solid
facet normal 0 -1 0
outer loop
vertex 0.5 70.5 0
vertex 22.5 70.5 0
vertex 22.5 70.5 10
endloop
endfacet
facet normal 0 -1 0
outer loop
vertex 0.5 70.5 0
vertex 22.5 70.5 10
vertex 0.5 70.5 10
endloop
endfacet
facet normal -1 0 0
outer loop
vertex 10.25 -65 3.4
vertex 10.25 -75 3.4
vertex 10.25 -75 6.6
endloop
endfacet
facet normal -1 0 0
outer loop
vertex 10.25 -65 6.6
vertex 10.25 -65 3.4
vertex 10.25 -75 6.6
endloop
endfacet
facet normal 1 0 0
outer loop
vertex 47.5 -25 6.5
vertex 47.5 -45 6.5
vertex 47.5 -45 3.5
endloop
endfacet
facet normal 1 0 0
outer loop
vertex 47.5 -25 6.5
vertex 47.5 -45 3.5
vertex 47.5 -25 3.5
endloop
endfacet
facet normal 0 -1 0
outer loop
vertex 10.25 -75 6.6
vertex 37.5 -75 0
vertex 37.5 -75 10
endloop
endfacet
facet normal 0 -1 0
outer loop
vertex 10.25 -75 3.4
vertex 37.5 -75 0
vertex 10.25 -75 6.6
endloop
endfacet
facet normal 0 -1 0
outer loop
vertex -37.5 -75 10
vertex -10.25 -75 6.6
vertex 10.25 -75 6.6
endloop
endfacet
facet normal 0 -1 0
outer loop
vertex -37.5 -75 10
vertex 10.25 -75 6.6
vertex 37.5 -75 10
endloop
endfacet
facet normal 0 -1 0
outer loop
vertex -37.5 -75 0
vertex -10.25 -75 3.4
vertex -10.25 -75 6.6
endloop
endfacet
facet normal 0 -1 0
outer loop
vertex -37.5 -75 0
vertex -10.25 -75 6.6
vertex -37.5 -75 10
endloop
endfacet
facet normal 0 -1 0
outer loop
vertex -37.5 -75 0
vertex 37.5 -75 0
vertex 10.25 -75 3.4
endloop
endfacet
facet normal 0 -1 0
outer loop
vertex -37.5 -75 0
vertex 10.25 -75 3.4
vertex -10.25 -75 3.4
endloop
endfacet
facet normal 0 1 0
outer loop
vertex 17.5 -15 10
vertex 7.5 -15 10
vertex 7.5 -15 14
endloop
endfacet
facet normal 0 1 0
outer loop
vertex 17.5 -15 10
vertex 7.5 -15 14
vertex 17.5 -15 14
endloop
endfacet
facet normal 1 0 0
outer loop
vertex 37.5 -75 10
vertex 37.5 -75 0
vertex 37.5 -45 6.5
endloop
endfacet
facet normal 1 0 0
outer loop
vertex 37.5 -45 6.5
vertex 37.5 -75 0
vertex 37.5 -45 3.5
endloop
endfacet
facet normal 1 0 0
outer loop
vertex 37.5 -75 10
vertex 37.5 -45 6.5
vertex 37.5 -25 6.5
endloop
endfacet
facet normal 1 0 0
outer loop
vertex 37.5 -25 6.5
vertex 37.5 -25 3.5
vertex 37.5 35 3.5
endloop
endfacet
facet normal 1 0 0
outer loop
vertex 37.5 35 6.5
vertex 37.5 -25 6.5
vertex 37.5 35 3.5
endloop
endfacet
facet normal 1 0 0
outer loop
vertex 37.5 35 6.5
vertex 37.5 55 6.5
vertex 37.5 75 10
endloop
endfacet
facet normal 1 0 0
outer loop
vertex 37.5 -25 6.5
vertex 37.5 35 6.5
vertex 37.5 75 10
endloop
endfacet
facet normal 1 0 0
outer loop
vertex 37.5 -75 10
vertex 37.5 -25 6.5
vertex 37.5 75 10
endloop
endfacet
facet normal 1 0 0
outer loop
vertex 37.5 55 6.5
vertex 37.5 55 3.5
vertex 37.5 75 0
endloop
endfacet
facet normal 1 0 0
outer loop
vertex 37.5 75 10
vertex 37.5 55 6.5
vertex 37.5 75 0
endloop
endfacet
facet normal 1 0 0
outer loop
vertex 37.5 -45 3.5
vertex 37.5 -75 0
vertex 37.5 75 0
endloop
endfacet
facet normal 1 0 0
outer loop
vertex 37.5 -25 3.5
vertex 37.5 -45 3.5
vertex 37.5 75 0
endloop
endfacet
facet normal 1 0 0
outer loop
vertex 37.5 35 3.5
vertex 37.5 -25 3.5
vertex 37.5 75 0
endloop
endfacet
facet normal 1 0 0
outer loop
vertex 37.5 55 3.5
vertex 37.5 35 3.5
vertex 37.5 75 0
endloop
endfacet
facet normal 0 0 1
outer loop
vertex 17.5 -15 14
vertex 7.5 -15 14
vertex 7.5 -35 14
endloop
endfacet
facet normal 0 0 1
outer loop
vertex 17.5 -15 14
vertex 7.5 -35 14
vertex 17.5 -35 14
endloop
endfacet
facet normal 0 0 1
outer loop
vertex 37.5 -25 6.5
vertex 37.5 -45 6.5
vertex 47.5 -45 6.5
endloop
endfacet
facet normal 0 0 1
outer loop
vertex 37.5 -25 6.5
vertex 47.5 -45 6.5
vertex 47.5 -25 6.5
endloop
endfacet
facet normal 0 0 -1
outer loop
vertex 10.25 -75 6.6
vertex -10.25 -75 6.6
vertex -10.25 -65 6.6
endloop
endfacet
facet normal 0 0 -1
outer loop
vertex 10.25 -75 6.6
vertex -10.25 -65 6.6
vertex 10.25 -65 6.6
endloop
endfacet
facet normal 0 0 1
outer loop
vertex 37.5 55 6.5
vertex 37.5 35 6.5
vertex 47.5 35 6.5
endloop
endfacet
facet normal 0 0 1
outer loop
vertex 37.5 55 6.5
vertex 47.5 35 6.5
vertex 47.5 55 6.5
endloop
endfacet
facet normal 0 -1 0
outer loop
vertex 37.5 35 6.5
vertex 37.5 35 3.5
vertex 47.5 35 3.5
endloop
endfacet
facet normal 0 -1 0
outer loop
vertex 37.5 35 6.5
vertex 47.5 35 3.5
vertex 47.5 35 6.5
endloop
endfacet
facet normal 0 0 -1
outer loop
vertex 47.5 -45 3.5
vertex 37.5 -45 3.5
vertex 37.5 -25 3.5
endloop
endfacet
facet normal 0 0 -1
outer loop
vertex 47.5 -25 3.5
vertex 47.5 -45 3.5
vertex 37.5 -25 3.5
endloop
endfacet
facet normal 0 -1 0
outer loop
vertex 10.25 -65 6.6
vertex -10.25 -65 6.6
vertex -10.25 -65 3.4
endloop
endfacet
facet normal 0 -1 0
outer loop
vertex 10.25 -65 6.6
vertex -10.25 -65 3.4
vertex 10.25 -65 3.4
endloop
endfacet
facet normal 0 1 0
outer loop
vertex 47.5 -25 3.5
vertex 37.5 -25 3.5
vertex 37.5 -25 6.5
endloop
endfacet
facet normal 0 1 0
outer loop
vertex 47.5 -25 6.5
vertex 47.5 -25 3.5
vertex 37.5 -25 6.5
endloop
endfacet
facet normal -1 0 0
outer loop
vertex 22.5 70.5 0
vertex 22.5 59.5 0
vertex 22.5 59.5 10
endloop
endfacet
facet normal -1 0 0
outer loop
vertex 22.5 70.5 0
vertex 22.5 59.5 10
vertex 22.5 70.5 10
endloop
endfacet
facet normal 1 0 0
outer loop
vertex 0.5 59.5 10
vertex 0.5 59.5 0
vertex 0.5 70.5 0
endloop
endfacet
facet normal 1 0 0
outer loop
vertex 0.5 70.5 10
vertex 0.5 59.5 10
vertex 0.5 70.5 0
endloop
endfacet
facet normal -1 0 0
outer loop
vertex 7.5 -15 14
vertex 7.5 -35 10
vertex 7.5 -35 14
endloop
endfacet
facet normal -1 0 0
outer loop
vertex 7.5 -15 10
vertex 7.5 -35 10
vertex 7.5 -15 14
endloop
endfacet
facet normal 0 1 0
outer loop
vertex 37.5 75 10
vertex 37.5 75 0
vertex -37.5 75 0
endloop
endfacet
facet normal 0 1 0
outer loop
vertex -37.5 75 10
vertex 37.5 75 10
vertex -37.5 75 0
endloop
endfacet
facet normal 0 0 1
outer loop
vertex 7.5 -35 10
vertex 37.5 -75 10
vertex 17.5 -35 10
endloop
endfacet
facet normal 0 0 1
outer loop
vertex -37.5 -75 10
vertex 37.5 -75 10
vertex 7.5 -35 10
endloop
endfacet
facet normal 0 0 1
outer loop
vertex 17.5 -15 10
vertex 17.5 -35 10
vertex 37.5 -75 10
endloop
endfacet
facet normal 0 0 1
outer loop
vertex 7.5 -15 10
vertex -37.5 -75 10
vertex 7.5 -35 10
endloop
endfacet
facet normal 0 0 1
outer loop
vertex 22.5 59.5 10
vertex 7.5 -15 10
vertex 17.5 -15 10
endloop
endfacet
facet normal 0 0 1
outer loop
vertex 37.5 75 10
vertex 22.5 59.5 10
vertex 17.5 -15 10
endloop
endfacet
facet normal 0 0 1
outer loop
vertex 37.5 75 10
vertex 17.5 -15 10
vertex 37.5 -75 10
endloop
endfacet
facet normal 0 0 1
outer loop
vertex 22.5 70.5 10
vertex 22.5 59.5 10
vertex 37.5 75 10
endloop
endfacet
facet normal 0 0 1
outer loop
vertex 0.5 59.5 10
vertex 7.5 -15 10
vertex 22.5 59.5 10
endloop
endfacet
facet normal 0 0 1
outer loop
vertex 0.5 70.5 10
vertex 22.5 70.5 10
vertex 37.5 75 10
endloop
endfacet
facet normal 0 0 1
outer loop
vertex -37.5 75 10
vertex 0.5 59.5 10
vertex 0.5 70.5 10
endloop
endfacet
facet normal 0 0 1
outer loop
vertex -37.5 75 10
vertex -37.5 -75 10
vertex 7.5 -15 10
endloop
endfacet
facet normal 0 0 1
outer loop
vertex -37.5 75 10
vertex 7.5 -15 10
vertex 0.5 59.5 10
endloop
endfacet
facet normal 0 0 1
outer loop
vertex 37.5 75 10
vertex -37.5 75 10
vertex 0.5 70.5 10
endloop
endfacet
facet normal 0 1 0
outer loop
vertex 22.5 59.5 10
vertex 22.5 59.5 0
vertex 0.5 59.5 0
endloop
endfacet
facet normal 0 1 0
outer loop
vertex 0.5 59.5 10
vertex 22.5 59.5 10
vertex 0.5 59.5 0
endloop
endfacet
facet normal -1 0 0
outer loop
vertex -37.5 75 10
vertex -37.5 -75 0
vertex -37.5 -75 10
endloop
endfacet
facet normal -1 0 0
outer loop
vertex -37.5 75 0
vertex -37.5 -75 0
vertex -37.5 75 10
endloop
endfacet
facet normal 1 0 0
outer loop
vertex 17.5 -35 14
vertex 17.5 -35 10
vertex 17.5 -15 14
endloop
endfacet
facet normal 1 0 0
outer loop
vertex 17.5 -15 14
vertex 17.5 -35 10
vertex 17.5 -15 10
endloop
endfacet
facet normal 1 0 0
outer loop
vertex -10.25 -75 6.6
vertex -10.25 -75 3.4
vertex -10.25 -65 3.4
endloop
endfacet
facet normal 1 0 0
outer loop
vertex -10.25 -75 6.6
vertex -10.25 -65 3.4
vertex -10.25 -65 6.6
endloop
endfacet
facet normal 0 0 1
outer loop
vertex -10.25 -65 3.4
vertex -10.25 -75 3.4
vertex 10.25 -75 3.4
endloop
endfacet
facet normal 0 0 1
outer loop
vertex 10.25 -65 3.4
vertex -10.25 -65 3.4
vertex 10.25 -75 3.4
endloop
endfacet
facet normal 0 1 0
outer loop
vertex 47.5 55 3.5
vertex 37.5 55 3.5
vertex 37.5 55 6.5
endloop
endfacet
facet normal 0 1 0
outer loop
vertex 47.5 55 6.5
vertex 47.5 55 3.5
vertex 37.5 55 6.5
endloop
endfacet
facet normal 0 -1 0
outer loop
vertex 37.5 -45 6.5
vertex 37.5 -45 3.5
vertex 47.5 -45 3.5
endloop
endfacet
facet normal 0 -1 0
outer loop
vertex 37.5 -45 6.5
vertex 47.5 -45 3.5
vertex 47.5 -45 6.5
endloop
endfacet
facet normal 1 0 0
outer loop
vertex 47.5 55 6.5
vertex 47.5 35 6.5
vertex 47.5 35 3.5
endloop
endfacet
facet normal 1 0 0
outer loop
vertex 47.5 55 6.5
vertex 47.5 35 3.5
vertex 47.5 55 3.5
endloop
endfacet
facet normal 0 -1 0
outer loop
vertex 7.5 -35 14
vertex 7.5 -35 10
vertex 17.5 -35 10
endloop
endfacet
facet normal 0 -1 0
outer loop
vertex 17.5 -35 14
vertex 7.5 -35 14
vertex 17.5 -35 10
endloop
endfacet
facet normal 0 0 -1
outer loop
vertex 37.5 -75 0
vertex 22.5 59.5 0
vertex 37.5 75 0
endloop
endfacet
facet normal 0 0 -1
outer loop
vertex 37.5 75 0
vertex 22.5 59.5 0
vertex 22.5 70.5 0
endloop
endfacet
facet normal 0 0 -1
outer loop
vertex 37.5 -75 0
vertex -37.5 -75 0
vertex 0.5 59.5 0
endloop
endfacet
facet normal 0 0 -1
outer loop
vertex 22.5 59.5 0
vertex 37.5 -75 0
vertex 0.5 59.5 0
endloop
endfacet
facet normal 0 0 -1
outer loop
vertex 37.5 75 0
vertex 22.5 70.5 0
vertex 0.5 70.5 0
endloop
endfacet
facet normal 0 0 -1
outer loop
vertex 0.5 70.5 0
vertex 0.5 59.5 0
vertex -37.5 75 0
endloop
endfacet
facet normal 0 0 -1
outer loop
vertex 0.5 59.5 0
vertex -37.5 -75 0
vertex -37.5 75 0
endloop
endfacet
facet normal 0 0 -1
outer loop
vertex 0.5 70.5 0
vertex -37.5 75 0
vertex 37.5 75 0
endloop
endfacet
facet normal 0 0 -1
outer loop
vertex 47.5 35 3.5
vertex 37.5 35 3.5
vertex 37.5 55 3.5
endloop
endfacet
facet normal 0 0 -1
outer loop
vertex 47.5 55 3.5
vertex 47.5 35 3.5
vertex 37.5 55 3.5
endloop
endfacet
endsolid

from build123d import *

# Parameters (mm, degrees)
SKETCH1_W           = 150
SKETCH1_H           = 75
SKETCH1_W_2         = 11
SKETCH1_H_2         = 22
BOSS_EXTRUDE1_DEPTH = 10
SKETCH2_W           = 10
SKETCH2_H           = 20
BOSS_EXTRUDE2_DEPTH = 4
SKETCH3_W           = 20
SKETCH3_H           = 3
BOSS_EXTRUDE3_DEPTH = 10
SKETCH4_W           = 20.5
SKETCH4_H           = 3.2
CUT_EXTRUDE1_DEPTH  = 10


with BuildPart() as part:
    # Sketch1 → Boss-Extrude1 (new body)
    with BuildSketch(Plane(origin=(0, 0, 0), x_dir=(0, 1, 0), z_dir=(0, 0, 1))):
        Rectangle(SKETCH1_W, SKETCH1_H)
        with Locations((65, -11.5)):
            Rectangle(SKETCH1_W_2, SKETCH1_H_2, mode=Mode.SUBTRACT)
    extrude(amount=BOSS_EXTRUDE1_DEPTH)

    # Sketch2 → Boss-Extrude2 (add)
    with BuildSketch(Plane.XY.offset(10)):
        with Locations((12.5, -25)):
            Rectangle(SKETCH2_W, SKETCH2_H)
    extrude(amount=BOSS_EXTRUDE2_DEPTH)

    # Sketch3 → Boss-Extrude3 (add)
    with BuildSketch(Plane.YZ.offset(37.5)):
        with Locations((45, 5)):
            Rectangle(SKETCH3_W, SKETCH3_H)
        with Locations((-35, 5)):
            Rectangle(SKETCH3_W, SKETCH3_H)
    extrude(amount=BOSS_EXTRUDE3_DEPTH)

    # Sketch4 → Cut-Extrude1 (cut)
    with BuildSketch(Plane.XZ.offset(75)):
        with Locations((0, 5)):
            Rectangle(SKETCH4_W, SKETCH4_H)
    extrude(amount=-CUT_EXTRUDE1_DEPTH, mode=Mode.SUBTRACT)


solid = part.part
